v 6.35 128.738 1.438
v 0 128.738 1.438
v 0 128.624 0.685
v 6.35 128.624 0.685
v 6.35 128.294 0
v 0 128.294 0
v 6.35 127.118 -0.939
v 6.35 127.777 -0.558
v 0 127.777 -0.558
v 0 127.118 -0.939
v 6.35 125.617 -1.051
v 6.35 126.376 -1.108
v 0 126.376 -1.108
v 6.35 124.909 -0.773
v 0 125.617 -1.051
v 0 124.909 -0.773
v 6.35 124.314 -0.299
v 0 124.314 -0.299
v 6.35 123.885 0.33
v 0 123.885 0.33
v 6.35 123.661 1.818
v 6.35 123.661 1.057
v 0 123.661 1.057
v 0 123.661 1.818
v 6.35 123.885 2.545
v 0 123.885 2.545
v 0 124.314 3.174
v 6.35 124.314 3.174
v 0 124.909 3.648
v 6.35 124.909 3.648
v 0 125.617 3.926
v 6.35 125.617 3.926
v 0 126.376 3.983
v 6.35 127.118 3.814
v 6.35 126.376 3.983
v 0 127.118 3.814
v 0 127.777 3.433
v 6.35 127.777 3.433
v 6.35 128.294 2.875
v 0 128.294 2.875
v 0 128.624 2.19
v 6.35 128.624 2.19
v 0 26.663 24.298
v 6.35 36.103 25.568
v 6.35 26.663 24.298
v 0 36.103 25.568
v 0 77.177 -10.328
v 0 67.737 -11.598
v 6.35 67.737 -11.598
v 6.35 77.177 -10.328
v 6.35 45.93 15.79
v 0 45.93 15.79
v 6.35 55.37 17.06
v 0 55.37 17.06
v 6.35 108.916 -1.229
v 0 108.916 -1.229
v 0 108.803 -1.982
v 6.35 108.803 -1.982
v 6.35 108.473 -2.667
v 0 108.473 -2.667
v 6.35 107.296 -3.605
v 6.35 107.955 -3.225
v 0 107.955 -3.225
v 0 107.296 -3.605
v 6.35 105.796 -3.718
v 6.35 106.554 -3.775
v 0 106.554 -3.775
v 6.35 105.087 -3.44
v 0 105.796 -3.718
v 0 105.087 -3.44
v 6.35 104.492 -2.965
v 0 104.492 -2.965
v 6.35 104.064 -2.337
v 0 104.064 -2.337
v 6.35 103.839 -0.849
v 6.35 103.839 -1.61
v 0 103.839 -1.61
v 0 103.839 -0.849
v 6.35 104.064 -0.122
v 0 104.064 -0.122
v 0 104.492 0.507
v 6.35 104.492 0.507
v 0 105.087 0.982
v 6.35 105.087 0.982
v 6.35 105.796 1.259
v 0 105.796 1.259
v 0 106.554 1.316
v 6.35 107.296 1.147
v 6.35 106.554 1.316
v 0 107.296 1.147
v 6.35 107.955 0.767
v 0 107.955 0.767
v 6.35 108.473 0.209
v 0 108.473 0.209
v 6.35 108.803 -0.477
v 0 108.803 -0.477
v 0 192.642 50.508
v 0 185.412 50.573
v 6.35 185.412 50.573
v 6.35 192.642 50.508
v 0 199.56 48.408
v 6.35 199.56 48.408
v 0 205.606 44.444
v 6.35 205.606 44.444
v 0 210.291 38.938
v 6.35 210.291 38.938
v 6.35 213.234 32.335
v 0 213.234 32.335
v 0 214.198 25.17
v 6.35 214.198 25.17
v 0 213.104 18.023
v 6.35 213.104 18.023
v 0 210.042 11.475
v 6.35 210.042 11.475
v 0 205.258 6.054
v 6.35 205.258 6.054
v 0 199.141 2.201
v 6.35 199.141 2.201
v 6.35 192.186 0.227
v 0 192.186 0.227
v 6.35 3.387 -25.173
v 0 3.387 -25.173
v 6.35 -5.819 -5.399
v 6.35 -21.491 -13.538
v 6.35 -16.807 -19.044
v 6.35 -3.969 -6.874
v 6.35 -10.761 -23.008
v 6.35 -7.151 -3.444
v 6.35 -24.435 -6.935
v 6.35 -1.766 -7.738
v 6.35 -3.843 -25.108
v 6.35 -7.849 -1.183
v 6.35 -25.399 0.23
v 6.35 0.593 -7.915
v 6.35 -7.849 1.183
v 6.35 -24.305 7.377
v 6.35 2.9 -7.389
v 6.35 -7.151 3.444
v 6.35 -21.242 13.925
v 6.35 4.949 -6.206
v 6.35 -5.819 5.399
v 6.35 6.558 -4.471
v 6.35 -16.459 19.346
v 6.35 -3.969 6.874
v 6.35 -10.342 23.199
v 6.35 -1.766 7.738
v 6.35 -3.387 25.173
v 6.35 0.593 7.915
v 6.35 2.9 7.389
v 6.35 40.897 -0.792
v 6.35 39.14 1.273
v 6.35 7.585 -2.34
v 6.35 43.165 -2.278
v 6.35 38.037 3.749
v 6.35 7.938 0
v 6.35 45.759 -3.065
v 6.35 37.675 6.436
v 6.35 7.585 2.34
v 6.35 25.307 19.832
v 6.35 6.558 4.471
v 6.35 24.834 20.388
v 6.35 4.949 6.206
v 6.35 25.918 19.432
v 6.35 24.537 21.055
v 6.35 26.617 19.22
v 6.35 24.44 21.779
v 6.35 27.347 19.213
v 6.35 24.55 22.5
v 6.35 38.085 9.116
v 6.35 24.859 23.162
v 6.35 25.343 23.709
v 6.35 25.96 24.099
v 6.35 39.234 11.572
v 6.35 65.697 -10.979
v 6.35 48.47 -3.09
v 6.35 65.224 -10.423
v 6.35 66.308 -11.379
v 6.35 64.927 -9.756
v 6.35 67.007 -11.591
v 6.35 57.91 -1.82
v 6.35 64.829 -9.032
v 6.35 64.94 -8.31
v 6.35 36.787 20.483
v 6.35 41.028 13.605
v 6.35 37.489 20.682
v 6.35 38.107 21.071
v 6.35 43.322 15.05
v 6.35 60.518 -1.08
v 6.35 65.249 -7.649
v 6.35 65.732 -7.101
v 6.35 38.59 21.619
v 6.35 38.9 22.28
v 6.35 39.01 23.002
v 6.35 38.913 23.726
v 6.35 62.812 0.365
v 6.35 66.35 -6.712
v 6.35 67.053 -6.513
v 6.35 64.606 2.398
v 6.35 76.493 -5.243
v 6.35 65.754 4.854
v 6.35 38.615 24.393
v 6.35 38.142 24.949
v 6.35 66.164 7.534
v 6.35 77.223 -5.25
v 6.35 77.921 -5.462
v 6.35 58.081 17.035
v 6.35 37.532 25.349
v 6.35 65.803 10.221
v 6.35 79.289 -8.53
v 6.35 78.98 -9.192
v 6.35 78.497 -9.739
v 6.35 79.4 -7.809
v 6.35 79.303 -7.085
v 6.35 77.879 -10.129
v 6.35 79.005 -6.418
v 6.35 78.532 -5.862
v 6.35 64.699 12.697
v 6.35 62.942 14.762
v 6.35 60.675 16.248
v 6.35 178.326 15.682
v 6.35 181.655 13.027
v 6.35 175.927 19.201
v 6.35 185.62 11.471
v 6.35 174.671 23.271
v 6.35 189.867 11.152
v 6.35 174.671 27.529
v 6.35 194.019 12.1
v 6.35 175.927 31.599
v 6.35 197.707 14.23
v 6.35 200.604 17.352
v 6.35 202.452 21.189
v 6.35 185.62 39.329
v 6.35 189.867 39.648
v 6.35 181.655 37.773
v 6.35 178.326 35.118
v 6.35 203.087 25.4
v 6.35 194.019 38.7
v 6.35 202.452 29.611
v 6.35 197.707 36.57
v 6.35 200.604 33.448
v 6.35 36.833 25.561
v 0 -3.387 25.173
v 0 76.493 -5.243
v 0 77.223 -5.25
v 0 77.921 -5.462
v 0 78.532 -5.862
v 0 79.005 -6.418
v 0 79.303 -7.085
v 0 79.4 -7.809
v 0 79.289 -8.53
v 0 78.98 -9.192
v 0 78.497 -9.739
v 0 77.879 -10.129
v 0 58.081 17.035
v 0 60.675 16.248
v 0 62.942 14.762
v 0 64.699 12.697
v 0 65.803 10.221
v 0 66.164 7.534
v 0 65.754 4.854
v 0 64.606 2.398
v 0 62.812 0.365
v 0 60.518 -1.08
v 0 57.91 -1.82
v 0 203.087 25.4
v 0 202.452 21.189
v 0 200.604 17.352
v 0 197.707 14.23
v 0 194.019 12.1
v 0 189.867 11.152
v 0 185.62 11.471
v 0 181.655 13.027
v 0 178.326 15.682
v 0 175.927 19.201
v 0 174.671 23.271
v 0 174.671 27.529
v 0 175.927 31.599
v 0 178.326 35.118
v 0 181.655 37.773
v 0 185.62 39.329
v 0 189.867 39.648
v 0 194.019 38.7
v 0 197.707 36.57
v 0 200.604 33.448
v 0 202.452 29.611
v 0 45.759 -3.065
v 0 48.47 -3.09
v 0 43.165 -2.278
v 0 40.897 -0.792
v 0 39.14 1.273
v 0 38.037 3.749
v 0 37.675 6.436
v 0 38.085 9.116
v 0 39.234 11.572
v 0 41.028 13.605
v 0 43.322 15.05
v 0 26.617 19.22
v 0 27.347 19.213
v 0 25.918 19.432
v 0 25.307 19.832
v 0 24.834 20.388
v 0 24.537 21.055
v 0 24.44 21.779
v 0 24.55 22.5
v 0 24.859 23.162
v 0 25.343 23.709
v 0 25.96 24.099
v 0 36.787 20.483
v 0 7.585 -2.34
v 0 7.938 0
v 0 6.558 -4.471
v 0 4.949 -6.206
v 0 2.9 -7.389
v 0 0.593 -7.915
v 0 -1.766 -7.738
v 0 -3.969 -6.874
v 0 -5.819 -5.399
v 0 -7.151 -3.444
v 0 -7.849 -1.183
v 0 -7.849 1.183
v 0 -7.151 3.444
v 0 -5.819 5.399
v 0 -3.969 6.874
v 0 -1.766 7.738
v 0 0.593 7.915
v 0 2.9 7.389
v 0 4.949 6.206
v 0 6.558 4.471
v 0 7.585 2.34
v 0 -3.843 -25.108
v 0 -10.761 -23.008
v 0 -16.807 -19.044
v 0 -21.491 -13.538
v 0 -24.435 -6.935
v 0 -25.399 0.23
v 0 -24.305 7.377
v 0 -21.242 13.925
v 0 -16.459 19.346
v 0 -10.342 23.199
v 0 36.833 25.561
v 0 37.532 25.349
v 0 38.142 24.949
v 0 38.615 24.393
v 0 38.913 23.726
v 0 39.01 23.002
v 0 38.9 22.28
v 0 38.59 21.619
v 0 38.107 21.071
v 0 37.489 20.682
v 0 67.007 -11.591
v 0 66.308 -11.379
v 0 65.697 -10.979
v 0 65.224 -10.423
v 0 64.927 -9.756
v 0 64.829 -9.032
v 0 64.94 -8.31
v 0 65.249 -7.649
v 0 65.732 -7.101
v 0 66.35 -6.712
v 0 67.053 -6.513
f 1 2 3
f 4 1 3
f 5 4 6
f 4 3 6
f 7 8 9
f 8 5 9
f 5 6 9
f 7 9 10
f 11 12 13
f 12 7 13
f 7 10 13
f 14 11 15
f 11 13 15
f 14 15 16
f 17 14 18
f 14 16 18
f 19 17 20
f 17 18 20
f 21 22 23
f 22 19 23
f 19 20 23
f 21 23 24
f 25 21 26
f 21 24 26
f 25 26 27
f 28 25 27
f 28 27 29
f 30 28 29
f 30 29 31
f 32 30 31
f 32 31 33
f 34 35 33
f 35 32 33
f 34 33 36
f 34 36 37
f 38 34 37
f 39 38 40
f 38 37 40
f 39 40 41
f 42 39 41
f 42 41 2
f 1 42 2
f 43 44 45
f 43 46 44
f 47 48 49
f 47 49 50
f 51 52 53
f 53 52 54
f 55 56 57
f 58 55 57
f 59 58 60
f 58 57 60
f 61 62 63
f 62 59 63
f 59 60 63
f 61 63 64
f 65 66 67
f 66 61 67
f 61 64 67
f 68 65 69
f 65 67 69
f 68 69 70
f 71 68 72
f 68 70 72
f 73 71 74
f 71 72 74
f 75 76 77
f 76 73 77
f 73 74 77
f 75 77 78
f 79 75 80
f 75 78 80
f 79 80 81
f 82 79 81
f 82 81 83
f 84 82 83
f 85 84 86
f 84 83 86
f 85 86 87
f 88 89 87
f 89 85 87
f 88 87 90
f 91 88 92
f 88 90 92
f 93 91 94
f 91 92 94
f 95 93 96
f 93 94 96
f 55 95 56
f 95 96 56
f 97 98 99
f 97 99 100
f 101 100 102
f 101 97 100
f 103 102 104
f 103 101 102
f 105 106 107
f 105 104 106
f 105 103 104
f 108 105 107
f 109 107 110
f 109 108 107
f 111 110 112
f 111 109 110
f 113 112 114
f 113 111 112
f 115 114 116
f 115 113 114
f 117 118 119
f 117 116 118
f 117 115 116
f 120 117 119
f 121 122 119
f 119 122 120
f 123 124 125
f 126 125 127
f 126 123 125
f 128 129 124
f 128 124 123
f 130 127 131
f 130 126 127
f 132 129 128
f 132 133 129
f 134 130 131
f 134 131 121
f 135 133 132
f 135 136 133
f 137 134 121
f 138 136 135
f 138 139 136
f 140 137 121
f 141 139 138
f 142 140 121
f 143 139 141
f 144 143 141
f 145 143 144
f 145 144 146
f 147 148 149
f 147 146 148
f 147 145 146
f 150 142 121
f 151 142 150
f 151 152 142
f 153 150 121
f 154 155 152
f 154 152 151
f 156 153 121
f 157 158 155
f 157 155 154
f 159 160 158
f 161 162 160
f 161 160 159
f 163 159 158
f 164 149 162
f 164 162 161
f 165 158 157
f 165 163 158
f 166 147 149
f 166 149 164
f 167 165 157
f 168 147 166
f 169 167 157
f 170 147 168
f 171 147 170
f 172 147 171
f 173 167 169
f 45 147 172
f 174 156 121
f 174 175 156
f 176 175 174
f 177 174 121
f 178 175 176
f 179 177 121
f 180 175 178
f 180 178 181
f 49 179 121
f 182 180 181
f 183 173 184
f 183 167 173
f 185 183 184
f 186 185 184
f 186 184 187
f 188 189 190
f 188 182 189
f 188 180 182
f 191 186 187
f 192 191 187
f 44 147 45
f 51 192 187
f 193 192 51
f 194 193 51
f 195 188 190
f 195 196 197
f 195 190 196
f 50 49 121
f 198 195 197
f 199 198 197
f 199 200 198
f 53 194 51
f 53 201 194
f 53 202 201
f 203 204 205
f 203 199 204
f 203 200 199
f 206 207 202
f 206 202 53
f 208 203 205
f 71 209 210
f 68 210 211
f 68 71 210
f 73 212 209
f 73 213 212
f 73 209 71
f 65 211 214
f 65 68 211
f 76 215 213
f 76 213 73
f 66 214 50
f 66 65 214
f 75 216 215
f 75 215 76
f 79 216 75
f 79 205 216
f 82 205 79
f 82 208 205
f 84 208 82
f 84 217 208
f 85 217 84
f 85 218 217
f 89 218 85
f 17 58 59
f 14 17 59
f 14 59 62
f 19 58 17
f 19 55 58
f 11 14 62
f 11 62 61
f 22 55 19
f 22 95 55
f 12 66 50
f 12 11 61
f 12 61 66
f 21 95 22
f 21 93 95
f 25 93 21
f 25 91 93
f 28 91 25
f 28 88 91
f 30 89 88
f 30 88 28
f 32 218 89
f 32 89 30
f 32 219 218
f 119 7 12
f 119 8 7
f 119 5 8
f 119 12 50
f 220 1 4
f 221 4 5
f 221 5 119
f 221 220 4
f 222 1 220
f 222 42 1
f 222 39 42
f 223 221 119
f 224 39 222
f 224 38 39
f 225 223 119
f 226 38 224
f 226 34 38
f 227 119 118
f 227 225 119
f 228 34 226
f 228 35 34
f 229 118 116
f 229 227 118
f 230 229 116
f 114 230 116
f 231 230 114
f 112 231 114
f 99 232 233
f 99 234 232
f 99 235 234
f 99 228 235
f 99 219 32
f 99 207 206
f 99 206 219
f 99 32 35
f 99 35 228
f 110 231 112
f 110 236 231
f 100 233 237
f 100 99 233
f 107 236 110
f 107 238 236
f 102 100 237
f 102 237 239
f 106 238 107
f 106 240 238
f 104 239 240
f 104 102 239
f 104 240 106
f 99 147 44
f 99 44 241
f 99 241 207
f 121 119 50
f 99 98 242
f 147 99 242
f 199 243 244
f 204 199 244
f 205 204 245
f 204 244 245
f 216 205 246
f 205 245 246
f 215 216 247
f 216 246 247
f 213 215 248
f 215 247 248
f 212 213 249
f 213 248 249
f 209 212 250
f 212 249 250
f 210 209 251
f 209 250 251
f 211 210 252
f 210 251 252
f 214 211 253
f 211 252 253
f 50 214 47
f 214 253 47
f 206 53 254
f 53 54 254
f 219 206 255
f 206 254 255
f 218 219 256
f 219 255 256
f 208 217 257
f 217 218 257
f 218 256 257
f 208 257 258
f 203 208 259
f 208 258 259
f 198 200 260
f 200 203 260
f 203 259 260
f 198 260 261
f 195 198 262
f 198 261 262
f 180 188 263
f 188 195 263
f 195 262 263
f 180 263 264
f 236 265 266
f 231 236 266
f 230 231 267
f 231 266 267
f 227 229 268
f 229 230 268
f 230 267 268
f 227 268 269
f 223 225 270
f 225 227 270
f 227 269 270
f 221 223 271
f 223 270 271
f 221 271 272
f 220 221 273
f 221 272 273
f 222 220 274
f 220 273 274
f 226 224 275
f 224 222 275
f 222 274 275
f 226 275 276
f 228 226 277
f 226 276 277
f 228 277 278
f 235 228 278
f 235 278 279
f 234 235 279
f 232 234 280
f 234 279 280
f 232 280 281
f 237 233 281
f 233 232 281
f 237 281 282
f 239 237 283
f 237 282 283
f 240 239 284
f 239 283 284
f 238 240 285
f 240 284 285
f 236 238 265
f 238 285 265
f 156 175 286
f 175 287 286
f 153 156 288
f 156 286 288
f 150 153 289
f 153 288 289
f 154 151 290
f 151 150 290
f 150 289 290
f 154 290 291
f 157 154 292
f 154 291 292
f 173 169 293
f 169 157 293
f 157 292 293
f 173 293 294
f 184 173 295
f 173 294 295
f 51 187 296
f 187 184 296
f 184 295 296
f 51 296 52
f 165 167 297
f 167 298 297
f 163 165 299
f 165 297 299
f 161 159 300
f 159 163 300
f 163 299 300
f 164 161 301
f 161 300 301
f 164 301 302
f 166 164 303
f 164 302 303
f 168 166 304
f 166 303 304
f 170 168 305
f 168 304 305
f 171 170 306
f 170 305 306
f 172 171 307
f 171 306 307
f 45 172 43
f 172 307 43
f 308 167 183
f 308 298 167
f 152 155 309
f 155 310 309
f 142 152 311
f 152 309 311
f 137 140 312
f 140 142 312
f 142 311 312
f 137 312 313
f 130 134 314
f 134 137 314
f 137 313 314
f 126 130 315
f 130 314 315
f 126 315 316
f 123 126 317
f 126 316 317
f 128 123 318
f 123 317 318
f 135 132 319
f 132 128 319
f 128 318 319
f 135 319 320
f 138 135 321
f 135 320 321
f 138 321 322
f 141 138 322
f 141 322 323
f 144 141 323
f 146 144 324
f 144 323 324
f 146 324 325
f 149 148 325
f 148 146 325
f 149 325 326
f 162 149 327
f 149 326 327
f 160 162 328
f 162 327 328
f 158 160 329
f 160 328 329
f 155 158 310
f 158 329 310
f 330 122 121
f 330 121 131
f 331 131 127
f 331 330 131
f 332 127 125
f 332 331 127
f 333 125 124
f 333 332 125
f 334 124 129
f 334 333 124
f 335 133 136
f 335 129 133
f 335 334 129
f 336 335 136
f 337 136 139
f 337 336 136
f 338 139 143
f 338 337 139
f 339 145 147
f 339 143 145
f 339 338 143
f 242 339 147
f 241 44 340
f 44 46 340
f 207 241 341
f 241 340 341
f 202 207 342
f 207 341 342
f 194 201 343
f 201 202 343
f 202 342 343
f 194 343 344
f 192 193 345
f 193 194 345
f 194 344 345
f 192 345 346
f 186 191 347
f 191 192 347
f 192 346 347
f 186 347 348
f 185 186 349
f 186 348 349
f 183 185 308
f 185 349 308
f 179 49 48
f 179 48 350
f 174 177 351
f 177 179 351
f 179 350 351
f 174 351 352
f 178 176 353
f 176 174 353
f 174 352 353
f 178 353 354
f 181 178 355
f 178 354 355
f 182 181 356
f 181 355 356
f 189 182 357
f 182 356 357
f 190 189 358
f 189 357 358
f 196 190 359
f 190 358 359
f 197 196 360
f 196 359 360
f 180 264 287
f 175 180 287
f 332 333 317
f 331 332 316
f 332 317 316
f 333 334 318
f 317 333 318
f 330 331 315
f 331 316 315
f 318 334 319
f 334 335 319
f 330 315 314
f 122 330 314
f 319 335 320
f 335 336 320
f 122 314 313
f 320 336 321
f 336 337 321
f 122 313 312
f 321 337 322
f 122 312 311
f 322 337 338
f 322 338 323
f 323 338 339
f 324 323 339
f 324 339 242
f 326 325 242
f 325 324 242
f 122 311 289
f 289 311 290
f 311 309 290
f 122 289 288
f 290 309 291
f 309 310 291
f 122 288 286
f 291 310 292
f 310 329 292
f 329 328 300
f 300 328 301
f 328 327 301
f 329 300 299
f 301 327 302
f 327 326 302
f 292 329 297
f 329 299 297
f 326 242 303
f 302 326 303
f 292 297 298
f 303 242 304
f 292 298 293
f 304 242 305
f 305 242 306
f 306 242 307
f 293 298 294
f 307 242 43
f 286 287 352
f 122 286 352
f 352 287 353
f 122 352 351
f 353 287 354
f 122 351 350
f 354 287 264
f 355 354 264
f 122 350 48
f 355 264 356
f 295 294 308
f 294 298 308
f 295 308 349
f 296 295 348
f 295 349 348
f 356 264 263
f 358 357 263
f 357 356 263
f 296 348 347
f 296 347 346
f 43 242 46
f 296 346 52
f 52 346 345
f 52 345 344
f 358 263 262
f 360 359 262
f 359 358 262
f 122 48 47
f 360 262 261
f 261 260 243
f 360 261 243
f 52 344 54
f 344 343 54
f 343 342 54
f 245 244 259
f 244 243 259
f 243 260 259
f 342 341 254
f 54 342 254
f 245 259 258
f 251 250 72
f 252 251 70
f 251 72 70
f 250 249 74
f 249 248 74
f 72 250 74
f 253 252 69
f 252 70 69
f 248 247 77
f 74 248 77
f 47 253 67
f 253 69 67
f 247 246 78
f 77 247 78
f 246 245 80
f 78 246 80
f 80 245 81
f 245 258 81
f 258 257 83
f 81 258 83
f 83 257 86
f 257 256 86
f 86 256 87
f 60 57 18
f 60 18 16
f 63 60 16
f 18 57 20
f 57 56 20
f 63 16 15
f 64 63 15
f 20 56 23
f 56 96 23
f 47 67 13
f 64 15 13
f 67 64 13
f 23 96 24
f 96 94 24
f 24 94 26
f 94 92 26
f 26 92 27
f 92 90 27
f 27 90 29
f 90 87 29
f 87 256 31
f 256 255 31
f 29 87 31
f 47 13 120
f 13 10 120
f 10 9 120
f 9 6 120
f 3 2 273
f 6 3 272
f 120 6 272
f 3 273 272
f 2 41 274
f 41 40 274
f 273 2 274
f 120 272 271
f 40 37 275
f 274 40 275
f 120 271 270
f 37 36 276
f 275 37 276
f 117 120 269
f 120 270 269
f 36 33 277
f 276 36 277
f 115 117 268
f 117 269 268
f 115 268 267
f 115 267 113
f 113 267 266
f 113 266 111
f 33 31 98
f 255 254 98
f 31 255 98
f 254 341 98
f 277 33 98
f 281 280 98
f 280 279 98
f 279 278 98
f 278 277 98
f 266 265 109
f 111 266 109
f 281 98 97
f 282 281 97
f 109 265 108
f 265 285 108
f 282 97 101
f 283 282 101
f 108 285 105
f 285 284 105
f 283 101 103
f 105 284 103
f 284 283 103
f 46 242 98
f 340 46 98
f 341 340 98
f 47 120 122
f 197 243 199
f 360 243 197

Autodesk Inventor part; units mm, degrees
ref_plane "YZ Plane" through (0, 0, 0) normal (1, 0, 0) x (0, 1, 0)
ref_plane "XZ Plane" through (0, 0, 0) normal (0, 1, 0) x (-1, 0, 0)
ref_plane "XY Plane" through (0, 0, 0) normal (0, 0, 1) x (1, 0, 0)
sketch "Sketch1" plane through (0, 0, 0) normal (1, 0, 0) x (0, 1, 0)
  circle A0 centre (0, 0) radius 7.9375
  arc A1 (-3.3867, 25.1732) -> (3.3867, -25.1732) centre (0, 0) ccw
  line L0 (3.3867, -25.1732) -> (192.1857, 0.2268)
  line L1 (0, -25.4) -> (385.0288, -25.4) construction
  circle A2 centre (56.6397, 7.62) radius 31.75 construction
  line L2 (56.6397, 7.62) -> (47.1998, 6.35) construction
  line L3 (57.9097, -1.82) -> (48.4698, -3.09)
  line L4 (45.9298, 15.79) -> (55.3697, 17.06)
  arc A3 (57.9097, -1.82) -> (55.3697, 17.06) centre (56.6397, 7.62) ccw
  arc A4 (45.9298, 15.79) -> (48.4698, -3.09) centre (47.1998, 6.35) ccw
  circle A5 centre (188.7991, 25.4) radius 50.8 construction
  circle A6 centre (188.7991, 25.4) radius 14.2875
  line L5 (137.4291, -7.1399) -> (134.7624, 12.6815) construction
  line L6 (134.7624, 12.6815) -> (95.1195, 7.3482) construction
  line L7 (95.1195, 7.3482) -> (97.7862, -12.4732) construction
  circle A7 centre (47.1998, 6.35) radius 31.75 construction
  line L8 (76.8346, -7.7854) -> (67.3947, -9.0554) construction
  line L9 (76.4926, -5.2429) -> (67.0526, -6.5129)
  line L10 (67.7367, -11.5979) -> (77.1767, -10.3279)
  arc A8 (77.1767, -10.3279) -> (76.4926, -5.2429) centre (76.8346, -7.7854) ccw
  arc A9 (67.0526, -6.5129) -> (67.7367, -11.5979) centre (67.3947, -9.0554) ccw
  line L11 (36.4448, 23.0254) -> (27.0049, 21.7554) construction
  line L12 (36.1028, 25.5679) -> (26.6628, 24.2979)
  line L13 (27.3469, 19.2129) -> (36.7869, 20.4829)
  arc A10 (36.7869, 20.4829) -> (36.1028, 25.5679) centre (36.4448, 23.0254) ccw
  arc A11 (26.6628, 24.2979) -> (27.3469, 19.2129) centre (27.0049, 21.7554) ccw
  line L14 (56.6397, 7.62) -> (76.8346, -7.7854) construction
  line L15 (56.6397, 7.62) -> (36.4448, 23.0254) construction
  line L16 (56.6397, 7.62) -> (88.1062, 11.8533) construction
  circle A12 centre (126.185, 1.4375) radius 2.5527
  circle A13 centre (106.3636, -1.2292) radius 2.5527
  line L17 (126.185, 1.4375) -> (106.3636, -1.2292) construction
  line L18 (126.185, 1.4375) -> (136.0957, 2.7708) construction
  line L19 (106.3636, -1.2292) -> (96.4529, -2.5625) construction
  line L20 (0, 0) -> (239.1455, 32.1733) construction
  arc A14 (192.1857, 0.2268) -> (185.4124, 50.5732) centre (188.7991, 25.4) ccw
  line L21 (185.4124, 50.5732) -> (-3.3867, 25.1732)
  point P0 (51.9197, 6.985)
  point P1 (72.1146, -8.4204)
  point P2 (31.7249, 22.3904)
  dimension "d1" = 63.5
  dimension "d5" = 101.6
  dimension "d0" = 15.875
  dimension "d2" = 50.8
  dimension "d3" = 9.525
  dimension "d4" = 9.525
  dimension "d6" = 28.575
  dimension "d8" = 20
  dimension "d9" = 40
  dimension "d11" = 2.5654
  dimension "d12" = 25.4
  dimension "d15" = 25.4
  dimension "d16" = 45
  dimension "d17" = 47.625
  dimension "d18" = 6.35
  dimension "d19" = 5.1054
  dimension "d20" = 20
  dimension "d21" = 241.3
extrude "Extrusion1" add sketch "Sketch1" along normal blind 6.35
properties part number "Arm Plates"
